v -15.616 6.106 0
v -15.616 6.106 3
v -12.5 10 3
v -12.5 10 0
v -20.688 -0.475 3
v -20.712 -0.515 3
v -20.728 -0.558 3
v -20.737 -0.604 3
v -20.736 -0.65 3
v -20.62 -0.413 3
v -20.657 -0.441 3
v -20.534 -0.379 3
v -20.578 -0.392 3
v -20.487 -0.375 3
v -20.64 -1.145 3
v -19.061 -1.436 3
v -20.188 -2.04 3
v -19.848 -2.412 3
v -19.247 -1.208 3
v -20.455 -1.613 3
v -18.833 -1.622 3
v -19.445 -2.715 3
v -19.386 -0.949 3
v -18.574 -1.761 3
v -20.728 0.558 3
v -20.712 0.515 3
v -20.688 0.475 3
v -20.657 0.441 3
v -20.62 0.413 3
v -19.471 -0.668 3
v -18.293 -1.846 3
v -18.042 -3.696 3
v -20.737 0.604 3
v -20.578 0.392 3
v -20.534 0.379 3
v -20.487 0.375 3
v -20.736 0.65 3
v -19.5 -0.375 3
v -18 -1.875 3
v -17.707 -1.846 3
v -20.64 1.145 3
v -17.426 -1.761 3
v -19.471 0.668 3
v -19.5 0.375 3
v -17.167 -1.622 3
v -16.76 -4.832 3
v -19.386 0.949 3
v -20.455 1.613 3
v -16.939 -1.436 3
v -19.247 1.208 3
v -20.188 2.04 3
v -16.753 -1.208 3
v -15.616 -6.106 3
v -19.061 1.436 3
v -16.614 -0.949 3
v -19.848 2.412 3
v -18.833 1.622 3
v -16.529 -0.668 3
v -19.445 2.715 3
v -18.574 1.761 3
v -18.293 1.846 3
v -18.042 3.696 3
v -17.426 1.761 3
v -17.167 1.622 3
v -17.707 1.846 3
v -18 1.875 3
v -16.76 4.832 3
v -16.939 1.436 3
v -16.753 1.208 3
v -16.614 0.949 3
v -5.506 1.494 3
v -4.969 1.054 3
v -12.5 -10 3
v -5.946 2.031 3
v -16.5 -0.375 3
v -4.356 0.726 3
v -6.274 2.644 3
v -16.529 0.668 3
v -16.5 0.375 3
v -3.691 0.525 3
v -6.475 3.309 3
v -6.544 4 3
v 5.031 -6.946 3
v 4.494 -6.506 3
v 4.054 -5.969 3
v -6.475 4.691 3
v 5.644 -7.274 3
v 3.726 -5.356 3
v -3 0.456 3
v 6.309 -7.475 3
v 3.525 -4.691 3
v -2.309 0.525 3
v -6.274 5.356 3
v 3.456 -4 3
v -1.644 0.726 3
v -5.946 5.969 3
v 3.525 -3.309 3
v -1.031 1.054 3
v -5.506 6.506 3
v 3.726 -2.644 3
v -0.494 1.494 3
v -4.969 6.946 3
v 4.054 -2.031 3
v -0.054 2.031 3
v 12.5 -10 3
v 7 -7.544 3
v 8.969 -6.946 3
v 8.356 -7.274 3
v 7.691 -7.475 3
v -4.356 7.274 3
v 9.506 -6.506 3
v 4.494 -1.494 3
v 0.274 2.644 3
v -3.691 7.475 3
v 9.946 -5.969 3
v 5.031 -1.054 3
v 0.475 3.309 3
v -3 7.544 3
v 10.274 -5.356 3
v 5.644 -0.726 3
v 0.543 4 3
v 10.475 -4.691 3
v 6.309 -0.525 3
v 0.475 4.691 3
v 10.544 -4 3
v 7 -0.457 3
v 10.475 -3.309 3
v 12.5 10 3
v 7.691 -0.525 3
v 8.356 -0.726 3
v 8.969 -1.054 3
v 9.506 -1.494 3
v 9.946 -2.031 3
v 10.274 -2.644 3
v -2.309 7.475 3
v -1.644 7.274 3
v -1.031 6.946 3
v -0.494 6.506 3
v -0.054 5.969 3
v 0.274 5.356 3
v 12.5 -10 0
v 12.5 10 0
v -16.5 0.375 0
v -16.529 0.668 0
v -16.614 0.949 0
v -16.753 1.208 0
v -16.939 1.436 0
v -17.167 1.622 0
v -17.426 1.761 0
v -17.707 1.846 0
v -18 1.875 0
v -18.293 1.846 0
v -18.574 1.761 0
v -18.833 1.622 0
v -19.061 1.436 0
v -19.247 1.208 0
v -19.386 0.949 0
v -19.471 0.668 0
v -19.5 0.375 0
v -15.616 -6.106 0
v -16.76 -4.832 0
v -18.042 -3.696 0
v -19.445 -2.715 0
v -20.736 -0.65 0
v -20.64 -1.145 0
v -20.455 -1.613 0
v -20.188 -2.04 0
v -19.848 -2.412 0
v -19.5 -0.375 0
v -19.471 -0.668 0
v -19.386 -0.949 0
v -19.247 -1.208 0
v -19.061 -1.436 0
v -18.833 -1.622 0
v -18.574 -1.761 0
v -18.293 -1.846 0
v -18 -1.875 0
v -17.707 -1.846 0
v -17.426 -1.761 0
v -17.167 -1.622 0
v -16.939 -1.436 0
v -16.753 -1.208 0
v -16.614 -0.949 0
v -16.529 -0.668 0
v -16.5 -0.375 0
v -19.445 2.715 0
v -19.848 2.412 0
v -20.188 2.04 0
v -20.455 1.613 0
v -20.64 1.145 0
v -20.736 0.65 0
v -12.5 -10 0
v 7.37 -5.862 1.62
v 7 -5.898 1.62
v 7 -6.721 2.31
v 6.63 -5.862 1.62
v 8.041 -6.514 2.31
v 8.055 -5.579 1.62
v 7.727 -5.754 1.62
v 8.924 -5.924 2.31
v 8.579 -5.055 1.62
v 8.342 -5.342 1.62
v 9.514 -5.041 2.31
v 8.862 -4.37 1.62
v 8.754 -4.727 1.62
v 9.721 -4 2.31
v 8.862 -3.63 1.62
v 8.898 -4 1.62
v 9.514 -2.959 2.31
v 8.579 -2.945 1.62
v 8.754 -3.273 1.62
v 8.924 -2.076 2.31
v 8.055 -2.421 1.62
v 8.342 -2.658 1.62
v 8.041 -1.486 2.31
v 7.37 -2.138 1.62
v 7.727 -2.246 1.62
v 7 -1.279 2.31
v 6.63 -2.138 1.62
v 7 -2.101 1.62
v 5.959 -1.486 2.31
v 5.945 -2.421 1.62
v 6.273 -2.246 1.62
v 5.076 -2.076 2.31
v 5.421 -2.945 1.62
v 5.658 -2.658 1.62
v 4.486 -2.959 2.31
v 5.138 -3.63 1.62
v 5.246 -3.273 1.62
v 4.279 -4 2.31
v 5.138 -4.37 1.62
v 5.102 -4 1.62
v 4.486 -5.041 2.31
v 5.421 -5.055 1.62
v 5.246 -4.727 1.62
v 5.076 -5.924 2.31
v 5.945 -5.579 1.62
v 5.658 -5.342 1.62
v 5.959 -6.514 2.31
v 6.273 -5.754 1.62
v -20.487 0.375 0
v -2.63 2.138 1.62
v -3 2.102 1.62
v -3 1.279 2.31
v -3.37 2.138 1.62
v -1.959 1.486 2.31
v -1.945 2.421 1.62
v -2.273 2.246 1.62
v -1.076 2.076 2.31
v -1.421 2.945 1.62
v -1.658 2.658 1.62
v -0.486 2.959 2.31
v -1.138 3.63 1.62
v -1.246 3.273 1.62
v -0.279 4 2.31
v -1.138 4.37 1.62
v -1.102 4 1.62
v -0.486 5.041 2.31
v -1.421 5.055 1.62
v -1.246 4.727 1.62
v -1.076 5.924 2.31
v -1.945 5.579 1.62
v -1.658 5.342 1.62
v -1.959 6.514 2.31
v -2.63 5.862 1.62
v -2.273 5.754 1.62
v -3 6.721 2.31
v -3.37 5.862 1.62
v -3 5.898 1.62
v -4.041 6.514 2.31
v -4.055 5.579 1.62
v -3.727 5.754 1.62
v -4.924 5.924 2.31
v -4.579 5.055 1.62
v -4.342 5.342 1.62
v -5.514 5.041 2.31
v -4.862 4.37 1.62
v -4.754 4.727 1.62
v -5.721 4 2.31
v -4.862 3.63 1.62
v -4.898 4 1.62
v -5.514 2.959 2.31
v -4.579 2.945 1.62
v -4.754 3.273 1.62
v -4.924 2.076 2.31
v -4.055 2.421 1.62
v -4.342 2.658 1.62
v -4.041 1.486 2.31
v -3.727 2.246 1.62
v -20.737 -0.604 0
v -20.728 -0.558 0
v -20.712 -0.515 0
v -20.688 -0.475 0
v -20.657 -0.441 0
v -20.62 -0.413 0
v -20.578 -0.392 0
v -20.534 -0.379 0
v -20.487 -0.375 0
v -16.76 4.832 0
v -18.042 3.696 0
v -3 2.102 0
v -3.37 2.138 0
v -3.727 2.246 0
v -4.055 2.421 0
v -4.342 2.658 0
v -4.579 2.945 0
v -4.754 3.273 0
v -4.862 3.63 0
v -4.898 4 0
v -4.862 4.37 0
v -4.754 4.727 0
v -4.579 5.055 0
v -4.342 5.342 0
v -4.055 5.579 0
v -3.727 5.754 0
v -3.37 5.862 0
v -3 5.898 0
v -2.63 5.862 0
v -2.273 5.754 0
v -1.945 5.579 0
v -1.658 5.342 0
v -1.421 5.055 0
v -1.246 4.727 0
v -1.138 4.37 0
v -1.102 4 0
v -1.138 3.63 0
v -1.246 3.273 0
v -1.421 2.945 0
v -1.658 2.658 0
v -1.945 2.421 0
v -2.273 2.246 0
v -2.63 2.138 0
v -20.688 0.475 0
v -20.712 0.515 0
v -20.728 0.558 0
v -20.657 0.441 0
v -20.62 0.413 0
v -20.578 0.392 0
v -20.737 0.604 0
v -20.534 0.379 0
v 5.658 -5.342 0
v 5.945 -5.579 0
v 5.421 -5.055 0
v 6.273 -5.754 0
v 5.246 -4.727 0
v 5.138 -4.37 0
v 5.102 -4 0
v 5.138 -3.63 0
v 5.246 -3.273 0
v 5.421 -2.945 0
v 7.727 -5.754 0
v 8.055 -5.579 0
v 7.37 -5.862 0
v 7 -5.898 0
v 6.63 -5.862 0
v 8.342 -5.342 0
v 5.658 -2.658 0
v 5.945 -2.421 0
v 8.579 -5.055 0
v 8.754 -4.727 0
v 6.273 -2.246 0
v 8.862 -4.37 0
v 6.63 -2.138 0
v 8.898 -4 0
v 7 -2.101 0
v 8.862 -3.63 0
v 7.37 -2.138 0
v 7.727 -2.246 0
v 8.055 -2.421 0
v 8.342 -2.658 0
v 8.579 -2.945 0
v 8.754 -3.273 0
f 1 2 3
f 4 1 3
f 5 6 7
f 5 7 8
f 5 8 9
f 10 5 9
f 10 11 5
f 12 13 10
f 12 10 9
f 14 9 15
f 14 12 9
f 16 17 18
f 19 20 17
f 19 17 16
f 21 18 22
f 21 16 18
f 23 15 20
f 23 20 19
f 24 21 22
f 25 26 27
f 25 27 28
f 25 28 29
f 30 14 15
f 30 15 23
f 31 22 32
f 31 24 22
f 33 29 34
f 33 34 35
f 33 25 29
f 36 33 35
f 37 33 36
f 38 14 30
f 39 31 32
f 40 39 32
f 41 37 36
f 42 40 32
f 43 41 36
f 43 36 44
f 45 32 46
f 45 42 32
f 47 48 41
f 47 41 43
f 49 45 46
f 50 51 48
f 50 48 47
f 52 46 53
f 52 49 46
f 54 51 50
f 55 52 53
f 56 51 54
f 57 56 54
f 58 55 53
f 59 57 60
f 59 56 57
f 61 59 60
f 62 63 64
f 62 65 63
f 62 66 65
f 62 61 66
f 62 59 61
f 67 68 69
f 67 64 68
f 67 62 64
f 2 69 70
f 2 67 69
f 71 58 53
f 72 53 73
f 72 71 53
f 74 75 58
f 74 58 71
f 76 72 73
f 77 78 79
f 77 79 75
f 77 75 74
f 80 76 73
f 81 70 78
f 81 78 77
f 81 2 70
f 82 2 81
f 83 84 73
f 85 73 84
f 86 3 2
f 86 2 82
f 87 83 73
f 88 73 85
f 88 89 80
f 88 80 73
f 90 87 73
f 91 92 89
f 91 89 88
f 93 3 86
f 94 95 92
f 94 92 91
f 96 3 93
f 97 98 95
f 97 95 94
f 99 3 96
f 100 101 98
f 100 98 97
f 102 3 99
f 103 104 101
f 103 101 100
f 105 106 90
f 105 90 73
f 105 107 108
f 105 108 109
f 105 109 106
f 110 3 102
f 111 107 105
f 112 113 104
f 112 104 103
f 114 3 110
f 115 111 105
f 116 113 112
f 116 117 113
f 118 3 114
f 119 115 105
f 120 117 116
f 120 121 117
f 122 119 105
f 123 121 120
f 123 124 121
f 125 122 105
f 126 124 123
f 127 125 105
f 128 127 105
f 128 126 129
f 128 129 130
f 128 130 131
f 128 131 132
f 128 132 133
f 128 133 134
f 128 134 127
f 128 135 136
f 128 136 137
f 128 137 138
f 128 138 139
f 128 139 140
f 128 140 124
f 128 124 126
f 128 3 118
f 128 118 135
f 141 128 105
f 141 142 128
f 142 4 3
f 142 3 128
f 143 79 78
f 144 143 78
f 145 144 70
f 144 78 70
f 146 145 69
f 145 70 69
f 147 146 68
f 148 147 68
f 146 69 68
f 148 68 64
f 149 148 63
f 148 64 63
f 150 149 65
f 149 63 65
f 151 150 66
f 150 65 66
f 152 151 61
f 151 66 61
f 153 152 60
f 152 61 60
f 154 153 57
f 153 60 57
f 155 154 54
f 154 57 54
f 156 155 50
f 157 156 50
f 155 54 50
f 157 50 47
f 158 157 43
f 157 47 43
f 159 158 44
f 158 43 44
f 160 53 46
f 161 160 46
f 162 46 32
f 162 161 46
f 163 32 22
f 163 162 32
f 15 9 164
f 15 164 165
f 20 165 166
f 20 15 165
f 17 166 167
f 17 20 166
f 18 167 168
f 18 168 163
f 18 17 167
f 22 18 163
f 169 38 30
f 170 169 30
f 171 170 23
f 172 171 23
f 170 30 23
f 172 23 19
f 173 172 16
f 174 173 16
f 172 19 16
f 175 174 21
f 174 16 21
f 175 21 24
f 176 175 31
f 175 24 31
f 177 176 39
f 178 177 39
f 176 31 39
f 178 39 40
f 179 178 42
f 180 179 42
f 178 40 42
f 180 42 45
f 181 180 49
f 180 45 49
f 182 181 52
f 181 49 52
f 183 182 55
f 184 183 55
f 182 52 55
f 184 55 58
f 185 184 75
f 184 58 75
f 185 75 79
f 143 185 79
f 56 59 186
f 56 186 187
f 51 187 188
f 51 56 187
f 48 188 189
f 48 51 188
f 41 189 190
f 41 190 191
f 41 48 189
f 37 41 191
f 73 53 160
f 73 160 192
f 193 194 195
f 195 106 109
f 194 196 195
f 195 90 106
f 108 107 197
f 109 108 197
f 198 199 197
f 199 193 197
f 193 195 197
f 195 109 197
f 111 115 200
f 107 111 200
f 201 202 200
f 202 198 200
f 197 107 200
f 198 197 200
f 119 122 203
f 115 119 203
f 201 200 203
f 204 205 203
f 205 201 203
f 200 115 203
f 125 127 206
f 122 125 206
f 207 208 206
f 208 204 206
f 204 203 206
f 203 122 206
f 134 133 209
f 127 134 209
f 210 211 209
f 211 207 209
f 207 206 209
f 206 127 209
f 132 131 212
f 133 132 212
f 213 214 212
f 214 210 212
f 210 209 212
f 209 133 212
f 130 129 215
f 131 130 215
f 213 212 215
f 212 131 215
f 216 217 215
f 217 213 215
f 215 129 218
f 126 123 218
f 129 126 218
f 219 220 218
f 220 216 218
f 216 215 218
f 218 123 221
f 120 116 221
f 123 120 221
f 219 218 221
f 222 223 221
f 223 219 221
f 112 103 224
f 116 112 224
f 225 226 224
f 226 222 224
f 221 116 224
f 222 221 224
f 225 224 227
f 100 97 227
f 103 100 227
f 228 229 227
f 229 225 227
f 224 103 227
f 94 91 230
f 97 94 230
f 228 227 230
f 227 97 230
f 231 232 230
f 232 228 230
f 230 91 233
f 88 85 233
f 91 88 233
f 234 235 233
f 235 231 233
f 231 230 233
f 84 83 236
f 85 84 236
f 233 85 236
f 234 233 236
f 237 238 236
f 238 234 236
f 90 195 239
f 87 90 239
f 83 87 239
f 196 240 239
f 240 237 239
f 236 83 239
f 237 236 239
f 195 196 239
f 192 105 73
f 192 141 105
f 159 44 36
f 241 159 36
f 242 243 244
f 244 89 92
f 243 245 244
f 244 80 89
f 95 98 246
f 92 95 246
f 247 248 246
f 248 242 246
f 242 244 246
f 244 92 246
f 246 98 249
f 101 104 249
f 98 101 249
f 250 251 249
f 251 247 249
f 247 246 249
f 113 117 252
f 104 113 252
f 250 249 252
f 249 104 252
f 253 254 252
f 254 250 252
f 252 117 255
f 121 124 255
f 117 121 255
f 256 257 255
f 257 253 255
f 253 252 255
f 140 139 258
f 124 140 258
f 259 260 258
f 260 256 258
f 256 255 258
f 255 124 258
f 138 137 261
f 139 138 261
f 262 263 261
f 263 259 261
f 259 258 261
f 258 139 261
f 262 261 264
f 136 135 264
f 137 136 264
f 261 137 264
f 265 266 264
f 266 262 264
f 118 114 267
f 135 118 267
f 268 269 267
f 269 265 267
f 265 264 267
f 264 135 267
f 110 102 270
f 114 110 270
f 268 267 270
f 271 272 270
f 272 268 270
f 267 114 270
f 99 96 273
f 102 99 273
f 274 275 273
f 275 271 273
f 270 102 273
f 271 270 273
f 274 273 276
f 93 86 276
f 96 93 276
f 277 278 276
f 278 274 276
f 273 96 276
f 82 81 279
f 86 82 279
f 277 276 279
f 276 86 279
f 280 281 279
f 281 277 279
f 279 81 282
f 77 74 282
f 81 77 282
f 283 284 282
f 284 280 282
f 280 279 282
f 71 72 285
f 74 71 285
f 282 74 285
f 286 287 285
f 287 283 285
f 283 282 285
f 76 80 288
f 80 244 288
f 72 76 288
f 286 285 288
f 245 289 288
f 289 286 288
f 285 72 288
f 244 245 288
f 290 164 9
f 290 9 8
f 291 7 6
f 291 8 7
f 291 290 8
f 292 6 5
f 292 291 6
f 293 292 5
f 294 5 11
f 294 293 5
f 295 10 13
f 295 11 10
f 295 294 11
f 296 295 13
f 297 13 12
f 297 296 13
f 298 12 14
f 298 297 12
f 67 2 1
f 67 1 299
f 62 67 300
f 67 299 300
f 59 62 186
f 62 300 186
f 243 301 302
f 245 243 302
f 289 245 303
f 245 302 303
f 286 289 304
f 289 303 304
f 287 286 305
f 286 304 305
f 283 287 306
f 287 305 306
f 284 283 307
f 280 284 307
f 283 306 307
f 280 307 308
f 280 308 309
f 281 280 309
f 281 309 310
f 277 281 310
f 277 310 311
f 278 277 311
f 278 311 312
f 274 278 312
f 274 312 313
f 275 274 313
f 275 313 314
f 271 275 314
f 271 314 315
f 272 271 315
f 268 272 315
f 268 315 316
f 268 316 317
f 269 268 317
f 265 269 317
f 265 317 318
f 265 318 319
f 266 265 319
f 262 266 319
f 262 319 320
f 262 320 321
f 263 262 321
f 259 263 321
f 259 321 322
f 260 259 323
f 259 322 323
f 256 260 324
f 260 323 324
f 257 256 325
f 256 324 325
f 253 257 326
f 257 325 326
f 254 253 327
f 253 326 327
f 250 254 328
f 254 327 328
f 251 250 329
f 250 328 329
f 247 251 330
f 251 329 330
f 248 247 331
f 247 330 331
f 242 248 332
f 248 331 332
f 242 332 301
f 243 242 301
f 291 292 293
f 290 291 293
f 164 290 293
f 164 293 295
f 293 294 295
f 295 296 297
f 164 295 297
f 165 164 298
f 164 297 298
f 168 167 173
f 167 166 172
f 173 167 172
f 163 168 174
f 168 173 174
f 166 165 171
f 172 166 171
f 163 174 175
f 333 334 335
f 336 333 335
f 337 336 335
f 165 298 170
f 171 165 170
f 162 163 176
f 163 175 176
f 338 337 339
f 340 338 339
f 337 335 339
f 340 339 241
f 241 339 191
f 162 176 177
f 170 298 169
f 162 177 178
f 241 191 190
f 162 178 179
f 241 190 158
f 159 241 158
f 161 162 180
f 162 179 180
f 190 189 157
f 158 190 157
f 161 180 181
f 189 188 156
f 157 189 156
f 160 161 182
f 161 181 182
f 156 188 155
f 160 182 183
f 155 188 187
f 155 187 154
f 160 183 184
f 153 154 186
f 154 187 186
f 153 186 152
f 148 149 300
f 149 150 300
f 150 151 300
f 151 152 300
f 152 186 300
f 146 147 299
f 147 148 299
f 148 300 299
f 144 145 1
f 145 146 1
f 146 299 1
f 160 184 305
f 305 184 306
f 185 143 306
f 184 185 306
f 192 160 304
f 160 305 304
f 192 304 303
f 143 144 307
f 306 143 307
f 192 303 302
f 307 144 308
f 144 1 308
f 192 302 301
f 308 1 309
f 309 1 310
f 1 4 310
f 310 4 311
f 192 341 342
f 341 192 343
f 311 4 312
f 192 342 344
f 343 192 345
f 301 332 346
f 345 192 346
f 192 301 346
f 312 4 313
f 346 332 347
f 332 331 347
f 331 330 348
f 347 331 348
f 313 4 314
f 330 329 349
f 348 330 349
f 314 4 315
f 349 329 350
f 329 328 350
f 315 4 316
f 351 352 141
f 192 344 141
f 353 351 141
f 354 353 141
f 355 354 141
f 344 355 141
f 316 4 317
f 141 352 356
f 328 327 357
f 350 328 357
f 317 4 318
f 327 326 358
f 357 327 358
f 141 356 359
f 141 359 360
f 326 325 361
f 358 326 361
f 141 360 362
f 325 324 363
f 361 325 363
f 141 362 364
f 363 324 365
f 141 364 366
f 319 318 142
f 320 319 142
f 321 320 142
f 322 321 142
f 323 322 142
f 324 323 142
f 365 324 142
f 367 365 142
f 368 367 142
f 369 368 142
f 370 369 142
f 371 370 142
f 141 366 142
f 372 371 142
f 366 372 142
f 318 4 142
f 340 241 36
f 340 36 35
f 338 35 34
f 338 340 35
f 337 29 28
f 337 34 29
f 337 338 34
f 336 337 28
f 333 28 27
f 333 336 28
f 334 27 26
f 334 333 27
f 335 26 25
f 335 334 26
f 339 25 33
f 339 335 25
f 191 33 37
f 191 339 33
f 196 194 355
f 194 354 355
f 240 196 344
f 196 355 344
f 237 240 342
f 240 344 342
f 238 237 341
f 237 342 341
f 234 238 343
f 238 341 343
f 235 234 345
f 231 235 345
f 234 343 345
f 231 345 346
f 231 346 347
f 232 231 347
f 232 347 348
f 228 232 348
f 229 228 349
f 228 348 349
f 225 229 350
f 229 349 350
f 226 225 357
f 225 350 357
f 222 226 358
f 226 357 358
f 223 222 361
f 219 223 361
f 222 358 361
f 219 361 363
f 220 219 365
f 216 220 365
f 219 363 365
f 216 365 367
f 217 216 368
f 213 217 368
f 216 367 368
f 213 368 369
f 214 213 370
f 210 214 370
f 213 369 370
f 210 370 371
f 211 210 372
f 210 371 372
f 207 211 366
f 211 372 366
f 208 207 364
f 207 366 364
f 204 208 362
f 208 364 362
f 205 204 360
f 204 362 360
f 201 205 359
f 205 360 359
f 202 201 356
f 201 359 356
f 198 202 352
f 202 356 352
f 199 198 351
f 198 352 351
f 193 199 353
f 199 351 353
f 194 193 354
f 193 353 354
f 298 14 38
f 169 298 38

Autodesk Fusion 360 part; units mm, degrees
sketch "Sketch1" plane through (0, 0, 0) normal (0, 0, 1) x (1, 0, 0)
  line L0 (-12.5, 10) -> (12.5, 10)
  line L1 (12.5, 10) -> (12.5, -10)
  line L2 (12.5, -10) -> (-12.5, -10)
  line L3 (-12.5, -10) -> (-12.5, 10)
  dimension "d1" = 20
  dimension "d2" = 25
  dimension "d3" = 12.5
  dimension "d4" = 10
extrude "Extrude1" add sketch "Sketch1" along normal blind 3
sketch "Sketch3" plane through (0, 0, 3) normal (0, 0, 1) x (-1, 0, 0)
  line L0 (12.5, -10) -> (12.5, 10)
  line L1 (12.5, 10) -> (-12.5, 10)
  line L2 (-12.5, 10) -> (-12.5, -10)
  line L3 (-12.5, -10) -> (12.5, -10)
  point P0 (3, -4)
  point P1 (-7, 4)
  dimension "d32" = 5.5
  dimension "d33" = 4
  dimension "d34" = 4
  dimension "d41" = 10
hole "Hole2" at (-3, 4, 3) at (7, -4, 3) direction (0, 0, -1) diameter 3.797 depth 6 tip angle 118 countersink diameter 7.087 countersink angle 100
sketch "Sketch4" plane through (0, 0, 3) normal (0, 0, 1) x (-1, 0, 0)
  circle A0 centre (3, -4) radius 3.5435
  circle A1 centre (-7, 4) radius 3.5435
  line L0 (12.5, 10) -> (-12.5, 10)
  line L1 (-12.5, 10) -> (-12.5, -10)
  line L2 (-12.5, -10) -> (12.5, -10)
  line L3 (12.5, -10) -> (12.5, 10)
  circle A2 centre (18, 0.375) radius 1.5
  circle A3 centre (18, -0.375) radius 1.5
  circle A4 centre (18, 0.375) radius 2.75
  circle A5 centre (18, -0.375) radius 2.75
  line L4 (18, 0.375) -> (17.0157, 0.375)
  line L5 (17.0157, 0.375) -> (17.0157, -0.375)
  line L6 (17.0157, -0.375) -> (18, -0.375)
  line L7 (18, -0.375) -> (18, 0.375)
  line L8 (18, -0.375) -> (24.9519, -0.375)
  line L9 (24.9519, -0.375) -> (24.9519, 0.375)
  line L10 (24.9519, 0.375) -> (18, 0.375)
  line L11 (18, 0.375) -> (18, -0.375)
  line L12 (16.5, 5) -> (16.5, -5)
  line L13 (16.5, 5) -> (12.5, 10)
  line L14 (16.5, -5) -> (12.5, -10)
  dimension "d44" = 3
  dimension "d45" = 3
  dimension "d46" = 5.5
  dimension "d47" = 5.5
  dimension "d48" = 0.75
  dimension "d49" = 0.375
  dimension "d50" = 1.5
  dimension "d51" = 10
  dimension "d52" = 5
  dimension "d55" = 4
extrude "Extrude4" add sketch "Sketch4" against normal blind 3 contours L3 A4 A5 L12 L13 L14 | A4 A5 L12 | A4 A5 L10 L12 | A4 A5 L8 L12 | A4 A5 L12 | A4 A5 L12 | A2 A5 L10 L12 | A3 A4 L8 L12
fillet "Fillet3" radius 15 2 edges at (-16.5, -2.6799, 1.5) (-16.5, 2.6799, 1.5)
fillet "Fillet3" radius 0.25 2 edges at (-20.75, 0.375, 1.5) (-20.75, -0.375, 1.5)
fillet "Fillet3" radius 2 2 edges at (-16.5, 5, 1.5) (-16.5, -5, 1.5)
equation "d49 = ( 0.75 / 2 ) * 1 mm"
